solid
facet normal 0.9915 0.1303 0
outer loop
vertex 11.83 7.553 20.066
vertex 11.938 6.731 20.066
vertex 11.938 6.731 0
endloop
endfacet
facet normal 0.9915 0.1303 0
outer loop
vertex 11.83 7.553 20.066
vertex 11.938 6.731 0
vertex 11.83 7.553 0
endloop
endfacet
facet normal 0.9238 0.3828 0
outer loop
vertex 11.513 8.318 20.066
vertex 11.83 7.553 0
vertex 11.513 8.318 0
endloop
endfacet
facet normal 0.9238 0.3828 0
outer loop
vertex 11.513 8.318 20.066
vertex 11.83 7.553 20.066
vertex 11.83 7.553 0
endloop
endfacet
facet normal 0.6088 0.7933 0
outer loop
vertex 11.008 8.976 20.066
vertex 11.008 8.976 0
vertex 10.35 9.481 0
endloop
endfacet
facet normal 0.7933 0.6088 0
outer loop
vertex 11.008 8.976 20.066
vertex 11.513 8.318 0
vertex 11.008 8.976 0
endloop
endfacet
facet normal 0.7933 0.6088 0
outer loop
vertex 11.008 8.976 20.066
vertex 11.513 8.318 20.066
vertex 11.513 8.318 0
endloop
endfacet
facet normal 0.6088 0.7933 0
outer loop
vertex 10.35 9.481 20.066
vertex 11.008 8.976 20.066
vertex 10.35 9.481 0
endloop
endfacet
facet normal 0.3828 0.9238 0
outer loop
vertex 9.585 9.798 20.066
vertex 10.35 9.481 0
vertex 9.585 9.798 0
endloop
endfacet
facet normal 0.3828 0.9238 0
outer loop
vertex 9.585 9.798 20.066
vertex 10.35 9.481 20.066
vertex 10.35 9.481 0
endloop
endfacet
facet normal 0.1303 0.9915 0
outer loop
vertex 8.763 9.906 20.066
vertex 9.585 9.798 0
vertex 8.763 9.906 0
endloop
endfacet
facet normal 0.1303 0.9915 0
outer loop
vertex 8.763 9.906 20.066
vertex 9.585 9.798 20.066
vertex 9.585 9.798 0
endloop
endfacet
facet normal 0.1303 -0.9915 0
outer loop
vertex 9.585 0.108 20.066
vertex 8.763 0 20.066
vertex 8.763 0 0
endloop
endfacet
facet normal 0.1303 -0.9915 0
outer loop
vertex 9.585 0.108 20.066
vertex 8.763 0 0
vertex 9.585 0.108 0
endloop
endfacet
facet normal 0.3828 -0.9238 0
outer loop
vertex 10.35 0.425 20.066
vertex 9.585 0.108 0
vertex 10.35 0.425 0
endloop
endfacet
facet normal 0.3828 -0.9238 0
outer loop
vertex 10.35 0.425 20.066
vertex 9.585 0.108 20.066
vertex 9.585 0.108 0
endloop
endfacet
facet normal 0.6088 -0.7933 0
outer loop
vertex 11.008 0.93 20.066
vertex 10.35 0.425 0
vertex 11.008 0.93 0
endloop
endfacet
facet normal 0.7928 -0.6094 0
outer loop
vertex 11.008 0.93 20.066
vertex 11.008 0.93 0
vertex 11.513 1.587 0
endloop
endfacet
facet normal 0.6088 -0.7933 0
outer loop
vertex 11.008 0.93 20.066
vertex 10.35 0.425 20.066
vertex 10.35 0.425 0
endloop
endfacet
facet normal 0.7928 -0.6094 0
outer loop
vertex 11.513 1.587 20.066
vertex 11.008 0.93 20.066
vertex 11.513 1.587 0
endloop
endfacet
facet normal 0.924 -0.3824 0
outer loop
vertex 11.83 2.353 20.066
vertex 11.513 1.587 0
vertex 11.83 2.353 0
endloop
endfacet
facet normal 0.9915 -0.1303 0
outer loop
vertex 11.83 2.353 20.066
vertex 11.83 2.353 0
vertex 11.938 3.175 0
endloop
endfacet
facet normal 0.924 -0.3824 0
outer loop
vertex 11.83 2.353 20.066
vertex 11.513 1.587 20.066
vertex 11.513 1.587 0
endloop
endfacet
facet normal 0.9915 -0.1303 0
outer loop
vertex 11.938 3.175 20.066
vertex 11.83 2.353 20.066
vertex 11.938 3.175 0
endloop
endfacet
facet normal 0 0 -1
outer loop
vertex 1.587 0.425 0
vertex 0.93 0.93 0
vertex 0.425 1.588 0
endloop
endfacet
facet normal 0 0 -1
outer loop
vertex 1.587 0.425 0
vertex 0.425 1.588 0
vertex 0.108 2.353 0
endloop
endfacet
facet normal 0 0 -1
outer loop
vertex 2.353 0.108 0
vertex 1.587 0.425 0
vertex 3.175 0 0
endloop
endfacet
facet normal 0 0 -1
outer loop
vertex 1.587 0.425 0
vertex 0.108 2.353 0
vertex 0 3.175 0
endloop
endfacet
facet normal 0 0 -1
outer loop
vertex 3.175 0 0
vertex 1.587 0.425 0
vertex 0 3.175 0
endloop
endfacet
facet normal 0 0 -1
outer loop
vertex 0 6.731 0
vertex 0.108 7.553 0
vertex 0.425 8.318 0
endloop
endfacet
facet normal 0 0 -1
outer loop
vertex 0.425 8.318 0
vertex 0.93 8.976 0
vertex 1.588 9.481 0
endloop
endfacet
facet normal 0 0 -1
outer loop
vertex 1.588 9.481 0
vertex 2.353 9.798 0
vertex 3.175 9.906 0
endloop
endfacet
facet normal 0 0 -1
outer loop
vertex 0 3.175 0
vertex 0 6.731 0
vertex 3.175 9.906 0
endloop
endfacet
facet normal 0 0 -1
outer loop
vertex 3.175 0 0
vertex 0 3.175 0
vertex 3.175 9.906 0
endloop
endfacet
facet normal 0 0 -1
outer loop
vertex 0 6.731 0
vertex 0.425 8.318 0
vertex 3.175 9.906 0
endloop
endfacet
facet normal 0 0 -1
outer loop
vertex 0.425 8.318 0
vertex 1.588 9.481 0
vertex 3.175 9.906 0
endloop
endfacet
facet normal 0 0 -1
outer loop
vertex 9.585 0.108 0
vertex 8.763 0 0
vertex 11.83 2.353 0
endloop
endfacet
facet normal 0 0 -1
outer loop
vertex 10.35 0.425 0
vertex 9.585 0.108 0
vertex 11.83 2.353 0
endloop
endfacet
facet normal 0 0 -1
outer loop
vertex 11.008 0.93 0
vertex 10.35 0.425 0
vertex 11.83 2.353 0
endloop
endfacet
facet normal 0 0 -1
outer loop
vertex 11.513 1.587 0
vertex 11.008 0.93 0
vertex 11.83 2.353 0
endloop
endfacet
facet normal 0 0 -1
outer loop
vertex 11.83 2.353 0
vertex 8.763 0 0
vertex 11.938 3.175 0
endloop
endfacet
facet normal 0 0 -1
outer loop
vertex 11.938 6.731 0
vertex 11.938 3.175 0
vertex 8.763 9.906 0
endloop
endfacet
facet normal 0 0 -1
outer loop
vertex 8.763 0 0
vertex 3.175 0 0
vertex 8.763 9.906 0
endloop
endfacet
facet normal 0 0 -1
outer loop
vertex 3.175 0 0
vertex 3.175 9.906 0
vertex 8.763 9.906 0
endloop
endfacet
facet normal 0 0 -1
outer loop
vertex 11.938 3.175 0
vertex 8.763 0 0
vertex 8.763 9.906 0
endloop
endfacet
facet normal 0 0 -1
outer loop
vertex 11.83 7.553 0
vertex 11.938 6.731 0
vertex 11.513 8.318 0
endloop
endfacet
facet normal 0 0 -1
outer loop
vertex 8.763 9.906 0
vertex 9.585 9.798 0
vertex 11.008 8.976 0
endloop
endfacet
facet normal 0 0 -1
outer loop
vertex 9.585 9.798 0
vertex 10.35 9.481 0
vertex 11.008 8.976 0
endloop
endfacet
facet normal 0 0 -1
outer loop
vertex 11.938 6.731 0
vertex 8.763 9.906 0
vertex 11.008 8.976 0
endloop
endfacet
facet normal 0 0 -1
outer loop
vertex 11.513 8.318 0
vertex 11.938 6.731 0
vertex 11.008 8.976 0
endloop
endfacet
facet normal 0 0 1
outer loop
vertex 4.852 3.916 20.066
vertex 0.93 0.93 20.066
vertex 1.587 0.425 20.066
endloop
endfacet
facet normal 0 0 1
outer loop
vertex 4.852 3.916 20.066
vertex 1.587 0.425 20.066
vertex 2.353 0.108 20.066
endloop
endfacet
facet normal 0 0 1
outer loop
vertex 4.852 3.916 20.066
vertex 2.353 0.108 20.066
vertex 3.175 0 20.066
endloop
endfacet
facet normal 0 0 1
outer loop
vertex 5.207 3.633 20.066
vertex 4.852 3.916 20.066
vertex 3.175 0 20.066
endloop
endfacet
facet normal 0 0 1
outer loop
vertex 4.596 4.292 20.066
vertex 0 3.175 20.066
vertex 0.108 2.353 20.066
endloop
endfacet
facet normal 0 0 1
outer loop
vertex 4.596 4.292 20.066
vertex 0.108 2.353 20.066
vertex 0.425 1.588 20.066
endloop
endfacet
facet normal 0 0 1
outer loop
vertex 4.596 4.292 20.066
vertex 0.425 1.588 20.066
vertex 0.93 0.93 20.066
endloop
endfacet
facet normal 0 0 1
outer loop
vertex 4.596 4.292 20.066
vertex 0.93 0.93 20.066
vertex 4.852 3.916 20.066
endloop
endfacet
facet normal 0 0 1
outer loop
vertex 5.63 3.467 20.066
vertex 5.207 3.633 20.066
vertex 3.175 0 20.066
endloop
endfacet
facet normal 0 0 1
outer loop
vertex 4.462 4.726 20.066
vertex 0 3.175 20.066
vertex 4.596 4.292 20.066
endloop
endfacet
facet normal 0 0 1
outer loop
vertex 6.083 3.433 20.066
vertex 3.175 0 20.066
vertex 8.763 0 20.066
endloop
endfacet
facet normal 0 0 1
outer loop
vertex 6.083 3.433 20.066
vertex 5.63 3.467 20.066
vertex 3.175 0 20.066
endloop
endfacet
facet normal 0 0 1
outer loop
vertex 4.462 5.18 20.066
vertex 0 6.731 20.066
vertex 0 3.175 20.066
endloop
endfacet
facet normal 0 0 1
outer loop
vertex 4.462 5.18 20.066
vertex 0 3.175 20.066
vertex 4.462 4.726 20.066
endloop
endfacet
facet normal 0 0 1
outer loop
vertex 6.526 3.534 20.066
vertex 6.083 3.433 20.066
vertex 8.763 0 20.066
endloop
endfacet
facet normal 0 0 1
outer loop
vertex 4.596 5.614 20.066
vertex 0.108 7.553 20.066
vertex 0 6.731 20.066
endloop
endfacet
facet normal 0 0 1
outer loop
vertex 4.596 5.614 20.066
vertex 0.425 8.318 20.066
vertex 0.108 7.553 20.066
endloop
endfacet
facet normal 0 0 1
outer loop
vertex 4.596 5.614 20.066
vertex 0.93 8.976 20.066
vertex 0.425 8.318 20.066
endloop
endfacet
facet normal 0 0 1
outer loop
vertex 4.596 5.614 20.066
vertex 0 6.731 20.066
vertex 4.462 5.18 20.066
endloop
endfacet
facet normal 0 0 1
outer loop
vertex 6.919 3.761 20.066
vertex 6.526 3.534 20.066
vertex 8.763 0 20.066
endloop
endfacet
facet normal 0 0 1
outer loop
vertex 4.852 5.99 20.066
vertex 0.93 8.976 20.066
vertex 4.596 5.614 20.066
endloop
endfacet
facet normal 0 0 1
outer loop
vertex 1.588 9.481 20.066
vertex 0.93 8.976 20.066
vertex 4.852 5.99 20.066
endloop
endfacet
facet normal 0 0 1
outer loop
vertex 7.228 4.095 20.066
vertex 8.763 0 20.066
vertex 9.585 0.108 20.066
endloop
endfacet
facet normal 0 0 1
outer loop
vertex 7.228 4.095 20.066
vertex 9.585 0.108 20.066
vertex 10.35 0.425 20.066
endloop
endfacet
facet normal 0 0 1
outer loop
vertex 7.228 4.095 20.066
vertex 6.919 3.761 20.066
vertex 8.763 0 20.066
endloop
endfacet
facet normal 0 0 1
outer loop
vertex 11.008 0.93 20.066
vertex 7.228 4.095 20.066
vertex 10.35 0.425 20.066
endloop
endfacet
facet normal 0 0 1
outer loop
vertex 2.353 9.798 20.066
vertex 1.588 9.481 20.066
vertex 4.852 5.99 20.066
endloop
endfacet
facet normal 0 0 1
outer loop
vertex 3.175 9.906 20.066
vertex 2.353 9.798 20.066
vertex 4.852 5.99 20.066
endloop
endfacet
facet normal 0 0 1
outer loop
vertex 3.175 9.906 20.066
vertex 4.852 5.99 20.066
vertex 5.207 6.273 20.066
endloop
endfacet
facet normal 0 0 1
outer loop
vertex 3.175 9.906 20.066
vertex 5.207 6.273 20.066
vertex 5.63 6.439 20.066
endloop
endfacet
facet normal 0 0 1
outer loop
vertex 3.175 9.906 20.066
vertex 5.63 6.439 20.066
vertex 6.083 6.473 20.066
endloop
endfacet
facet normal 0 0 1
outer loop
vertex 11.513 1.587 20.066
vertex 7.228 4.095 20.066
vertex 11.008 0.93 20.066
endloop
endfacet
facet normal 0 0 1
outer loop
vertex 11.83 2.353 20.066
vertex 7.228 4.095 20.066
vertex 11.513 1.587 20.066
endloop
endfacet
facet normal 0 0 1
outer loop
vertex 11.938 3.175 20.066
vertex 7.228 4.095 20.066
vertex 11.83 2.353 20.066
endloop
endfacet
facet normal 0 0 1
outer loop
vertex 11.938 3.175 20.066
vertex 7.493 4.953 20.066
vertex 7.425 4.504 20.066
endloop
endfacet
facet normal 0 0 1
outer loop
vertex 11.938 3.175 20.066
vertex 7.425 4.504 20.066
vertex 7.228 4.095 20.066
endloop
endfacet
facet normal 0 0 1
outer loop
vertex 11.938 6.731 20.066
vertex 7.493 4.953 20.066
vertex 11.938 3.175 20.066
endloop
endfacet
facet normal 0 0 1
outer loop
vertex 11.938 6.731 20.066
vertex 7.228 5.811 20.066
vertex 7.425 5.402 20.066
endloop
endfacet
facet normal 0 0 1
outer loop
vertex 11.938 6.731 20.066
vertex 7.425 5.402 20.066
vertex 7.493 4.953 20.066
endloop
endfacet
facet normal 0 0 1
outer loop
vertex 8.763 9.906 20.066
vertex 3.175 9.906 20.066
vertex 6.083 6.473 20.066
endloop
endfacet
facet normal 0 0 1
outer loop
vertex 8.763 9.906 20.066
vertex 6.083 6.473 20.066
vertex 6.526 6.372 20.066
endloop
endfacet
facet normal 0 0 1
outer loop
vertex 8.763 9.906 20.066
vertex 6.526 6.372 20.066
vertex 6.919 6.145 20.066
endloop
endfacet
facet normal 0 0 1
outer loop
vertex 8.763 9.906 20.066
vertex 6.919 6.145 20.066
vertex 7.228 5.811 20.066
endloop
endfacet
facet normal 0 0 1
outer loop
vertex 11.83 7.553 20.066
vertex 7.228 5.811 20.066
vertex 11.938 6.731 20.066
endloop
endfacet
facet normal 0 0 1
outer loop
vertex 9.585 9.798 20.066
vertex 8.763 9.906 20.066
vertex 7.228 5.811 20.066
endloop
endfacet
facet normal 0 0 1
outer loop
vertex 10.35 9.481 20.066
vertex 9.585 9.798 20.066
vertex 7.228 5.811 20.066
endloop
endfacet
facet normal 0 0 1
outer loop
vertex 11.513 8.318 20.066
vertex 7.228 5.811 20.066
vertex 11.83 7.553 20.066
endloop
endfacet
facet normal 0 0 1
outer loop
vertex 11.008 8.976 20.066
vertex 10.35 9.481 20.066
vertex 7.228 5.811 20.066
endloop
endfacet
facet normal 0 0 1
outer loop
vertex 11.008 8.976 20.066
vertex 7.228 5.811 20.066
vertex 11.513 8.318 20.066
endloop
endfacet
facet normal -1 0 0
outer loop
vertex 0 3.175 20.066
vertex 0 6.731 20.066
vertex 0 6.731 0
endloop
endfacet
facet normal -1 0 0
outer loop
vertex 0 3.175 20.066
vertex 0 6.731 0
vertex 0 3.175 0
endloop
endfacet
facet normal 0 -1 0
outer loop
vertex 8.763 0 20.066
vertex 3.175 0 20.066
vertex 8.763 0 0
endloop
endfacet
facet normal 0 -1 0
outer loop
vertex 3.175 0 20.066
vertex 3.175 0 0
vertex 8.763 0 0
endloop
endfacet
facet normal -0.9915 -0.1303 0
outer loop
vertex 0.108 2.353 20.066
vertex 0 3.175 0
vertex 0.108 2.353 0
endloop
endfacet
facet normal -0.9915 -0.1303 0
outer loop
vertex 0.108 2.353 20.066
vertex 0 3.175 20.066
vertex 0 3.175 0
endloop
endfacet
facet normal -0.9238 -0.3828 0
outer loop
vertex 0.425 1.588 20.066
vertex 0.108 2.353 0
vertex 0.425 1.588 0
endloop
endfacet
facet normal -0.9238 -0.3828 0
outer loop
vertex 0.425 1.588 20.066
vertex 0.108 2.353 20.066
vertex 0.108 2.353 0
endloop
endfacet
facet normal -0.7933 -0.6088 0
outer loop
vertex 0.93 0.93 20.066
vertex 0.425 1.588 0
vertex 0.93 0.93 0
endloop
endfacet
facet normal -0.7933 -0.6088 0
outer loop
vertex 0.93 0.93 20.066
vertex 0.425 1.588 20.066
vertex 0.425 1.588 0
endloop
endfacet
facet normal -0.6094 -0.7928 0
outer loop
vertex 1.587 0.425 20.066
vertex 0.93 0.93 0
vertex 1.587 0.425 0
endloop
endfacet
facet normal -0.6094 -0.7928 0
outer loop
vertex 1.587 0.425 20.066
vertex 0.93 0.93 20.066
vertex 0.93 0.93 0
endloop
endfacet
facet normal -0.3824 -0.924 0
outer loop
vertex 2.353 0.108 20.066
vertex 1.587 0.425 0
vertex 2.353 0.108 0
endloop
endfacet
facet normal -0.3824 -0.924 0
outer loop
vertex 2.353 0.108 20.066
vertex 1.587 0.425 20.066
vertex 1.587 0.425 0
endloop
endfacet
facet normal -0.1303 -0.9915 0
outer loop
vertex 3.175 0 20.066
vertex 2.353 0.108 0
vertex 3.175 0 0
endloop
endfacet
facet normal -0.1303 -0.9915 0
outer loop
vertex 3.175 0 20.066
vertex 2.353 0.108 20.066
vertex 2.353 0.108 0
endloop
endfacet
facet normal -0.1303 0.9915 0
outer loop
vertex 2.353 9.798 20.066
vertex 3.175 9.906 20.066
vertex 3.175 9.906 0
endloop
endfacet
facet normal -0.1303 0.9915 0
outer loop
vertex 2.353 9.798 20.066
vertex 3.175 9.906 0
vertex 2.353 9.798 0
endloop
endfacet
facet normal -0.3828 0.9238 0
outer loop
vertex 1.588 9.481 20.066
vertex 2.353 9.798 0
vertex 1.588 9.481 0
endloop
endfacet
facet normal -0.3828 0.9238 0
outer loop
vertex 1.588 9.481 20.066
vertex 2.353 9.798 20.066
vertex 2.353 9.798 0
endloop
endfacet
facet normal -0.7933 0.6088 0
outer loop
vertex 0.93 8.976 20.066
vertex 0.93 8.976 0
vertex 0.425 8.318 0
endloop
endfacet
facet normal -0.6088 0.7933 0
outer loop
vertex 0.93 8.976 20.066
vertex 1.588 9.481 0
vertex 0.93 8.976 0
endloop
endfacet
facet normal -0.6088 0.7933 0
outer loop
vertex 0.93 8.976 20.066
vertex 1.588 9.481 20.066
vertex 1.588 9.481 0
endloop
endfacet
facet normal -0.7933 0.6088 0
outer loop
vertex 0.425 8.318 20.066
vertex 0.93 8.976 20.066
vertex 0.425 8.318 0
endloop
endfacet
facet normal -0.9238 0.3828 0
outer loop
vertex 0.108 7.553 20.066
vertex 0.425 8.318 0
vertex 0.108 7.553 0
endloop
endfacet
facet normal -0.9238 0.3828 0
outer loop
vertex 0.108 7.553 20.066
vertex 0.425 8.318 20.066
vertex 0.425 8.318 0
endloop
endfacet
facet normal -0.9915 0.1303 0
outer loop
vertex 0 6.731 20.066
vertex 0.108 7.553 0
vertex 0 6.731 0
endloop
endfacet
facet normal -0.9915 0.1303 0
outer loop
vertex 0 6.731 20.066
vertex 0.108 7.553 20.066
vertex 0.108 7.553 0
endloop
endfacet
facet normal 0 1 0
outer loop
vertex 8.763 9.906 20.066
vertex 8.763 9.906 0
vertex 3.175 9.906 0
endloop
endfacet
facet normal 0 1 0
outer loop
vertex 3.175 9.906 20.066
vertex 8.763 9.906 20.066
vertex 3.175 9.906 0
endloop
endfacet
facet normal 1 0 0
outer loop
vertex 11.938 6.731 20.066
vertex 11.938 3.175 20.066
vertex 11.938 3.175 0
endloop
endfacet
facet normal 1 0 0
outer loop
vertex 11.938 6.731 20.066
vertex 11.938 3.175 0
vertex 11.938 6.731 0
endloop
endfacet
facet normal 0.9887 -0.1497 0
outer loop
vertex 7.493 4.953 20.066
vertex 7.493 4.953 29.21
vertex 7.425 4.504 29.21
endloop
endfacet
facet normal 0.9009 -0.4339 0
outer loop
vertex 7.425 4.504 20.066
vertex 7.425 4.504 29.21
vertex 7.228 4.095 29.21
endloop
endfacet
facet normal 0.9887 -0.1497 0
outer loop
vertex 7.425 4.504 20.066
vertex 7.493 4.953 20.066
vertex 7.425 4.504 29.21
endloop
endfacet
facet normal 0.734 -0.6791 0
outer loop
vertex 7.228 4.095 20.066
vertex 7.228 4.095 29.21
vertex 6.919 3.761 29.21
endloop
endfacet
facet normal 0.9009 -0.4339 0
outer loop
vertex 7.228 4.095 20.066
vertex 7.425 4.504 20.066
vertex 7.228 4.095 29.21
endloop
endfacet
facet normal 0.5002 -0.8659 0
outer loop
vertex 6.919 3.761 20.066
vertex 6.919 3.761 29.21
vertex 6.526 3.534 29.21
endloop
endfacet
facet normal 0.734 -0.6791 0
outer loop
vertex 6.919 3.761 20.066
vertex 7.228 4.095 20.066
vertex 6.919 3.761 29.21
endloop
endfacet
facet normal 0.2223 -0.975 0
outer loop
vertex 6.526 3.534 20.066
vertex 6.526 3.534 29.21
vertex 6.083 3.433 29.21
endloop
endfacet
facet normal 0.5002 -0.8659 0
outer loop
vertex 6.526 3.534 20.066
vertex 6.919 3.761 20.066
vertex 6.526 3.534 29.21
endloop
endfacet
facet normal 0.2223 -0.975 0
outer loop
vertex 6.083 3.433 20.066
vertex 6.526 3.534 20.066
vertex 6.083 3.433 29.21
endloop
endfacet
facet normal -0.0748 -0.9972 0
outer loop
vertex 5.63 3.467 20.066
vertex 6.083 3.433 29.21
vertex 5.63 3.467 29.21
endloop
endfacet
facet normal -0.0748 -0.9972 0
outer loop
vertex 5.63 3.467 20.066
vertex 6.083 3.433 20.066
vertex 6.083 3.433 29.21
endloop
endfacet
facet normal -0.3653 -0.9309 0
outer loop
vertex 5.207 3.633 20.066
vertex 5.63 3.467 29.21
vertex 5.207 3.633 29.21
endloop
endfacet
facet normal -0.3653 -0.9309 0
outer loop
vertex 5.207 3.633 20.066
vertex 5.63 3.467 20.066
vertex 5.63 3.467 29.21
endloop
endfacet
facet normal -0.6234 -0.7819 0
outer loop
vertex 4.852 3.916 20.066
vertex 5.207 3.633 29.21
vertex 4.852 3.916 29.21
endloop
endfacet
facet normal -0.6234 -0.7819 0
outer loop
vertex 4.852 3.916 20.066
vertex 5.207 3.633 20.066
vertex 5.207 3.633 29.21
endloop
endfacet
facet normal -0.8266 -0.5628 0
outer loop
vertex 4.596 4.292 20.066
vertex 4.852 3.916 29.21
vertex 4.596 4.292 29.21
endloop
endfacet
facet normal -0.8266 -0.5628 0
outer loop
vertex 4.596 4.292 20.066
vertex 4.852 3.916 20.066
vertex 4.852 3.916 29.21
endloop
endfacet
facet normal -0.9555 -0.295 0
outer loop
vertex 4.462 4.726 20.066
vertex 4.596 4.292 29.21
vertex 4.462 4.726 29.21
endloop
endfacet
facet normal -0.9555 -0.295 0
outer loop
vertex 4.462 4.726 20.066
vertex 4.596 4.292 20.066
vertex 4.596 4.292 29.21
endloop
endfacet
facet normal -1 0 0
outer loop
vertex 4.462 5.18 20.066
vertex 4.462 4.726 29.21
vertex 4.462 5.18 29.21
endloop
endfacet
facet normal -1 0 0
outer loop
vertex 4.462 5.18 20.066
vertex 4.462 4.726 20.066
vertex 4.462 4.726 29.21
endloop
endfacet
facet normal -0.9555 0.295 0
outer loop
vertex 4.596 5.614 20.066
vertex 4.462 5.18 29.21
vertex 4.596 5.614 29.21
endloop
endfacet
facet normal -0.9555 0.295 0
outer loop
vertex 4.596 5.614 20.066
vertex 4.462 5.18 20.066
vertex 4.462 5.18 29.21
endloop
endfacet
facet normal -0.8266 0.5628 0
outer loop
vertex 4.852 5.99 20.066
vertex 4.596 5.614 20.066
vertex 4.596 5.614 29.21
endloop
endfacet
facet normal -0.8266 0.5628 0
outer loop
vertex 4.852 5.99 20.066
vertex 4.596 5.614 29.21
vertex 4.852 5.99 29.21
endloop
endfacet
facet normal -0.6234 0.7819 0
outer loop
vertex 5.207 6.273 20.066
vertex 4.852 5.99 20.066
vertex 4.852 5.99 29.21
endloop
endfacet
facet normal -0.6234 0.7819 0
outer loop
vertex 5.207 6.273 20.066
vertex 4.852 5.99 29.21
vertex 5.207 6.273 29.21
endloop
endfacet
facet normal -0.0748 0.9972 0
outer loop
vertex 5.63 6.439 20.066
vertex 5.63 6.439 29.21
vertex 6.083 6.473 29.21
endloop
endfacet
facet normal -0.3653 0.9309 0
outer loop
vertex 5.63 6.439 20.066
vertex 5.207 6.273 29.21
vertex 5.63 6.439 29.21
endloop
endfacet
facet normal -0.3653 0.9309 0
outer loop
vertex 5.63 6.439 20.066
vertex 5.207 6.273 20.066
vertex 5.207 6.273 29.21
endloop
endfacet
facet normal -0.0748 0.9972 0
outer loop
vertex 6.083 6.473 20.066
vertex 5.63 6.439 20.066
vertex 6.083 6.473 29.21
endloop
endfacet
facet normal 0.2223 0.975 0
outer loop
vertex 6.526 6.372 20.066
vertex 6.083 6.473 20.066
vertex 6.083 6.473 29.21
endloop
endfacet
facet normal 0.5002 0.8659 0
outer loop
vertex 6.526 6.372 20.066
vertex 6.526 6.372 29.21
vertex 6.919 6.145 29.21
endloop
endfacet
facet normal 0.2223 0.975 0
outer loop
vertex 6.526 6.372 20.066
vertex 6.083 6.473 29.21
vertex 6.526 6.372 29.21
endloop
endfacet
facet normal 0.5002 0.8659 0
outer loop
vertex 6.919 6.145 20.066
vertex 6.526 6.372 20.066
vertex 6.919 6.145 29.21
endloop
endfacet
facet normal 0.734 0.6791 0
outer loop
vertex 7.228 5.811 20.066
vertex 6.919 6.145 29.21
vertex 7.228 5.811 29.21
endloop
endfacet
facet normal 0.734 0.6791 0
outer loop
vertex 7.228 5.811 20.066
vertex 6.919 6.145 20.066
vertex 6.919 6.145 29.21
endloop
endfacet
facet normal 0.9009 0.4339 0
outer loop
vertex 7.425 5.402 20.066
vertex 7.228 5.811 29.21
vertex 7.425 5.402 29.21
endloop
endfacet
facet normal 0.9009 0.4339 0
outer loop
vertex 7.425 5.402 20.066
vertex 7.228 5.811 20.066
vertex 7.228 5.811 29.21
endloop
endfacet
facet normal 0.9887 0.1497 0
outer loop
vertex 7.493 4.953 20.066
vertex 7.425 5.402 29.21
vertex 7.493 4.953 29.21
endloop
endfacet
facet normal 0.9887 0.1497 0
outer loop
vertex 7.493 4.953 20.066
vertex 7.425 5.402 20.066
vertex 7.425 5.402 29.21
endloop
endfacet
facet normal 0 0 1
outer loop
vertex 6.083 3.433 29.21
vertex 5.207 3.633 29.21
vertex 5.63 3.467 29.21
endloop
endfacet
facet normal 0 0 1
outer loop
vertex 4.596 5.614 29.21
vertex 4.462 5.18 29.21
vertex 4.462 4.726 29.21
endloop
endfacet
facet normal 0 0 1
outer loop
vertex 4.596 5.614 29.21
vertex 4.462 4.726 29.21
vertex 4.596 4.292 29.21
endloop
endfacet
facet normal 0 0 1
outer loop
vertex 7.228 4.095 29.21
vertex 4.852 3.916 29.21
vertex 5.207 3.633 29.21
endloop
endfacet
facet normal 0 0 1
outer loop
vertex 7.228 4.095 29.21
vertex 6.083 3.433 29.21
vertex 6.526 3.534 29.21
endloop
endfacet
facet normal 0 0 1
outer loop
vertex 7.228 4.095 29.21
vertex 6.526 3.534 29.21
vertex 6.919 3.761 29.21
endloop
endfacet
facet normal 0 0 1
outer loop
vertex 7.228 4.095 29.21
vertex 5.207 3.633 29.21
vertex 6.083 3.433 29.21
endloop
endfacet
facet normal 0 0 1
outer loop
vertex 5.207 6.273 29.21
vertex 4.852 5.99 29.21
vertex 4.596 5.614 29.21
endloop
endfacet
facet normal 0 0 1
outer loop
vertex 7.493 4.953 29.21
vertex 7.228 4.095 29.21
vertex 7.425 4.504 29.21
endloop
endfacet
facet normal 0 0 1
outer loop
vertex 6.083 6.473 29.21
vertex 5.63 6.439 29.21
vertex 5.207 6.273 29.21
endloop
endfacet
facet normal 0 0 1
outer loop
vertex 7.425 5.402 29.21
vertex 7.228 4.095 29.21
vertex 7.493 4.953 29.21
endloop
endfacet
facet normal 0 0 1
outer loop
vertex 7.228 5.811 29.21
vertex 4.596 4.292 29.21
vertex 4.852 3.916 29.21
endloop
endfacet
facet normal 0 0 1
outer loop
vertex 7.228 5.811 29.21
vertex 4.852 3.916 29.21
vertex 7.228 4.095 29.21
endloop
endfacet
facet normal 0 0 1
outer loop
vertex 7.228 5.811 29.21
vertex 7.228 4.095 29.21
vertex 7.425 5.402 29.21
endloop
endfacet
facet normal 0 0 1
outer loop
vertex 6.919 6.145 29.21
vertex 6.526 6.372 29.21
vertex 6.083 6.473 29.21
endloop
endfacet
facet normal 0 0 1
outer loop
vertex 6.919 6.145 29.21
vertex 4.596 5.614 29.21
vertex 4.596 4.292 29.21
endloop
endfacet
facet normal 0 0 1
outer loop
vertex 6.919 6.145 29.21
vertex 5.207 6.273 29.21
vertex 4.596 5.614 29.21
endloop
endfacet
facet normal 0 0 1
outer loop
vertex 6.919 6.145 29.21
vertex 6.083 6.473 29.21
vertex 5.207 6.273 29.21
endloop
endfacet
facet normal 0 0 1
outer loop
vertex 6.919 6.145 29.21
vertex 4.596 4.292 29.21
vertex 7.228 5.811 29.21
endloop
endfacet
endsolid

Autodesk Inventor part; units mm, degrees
ref_plane "YZ Plane" through (0, 0, 0) normal (1, 0, 0) x (0, 1, 0)
ref_plane "XZ Plane" through (0, 0, 0) normal (0, 1, 0) x (-1, 0, 0)
ref_plane "XY Plane" through (0, 0, 0) normal (0, 0, 1) x (1, 0, 0)
sketch "Sketch1" plane through (0, 0, 0) normal (0, 0, 1) x (1, 0, 0)
  line L0 (0, 0) -> (11.938, 0)
  line L1 (11.938, 0) -> (11.938, 9.906)
  line L2 (11.938, 9.906) -> (0, 9.906)
  line L3 (0, 9.906) -> (0, 0)
  circle A0 centre (5.969, 4.953) radius 1.524
  point P0 (0, 4.953)
  point P1 (5.969, 9.906)
  dimension "d0" = 11.938
  dimension "d1" = 9.906
  dimension "d2" = 3.048
extrude "Extrusion1" add sketch "Sketch1" along normal blind 20.066 contours L3 L2 L1 L0 | A0
extrude "Extrusion2" add sketch "Sketch1" along normal blind 29.21 contours A0
fillet "Fillet1" radius 3.175 4 edges at (11.938, 9.906, 10.033) (11.938, 0, 10.033) (0, 9.906, 10.033) (0, 0, 10.033)
properties part number "OGGearMotor" material "Steel, Carbon"
